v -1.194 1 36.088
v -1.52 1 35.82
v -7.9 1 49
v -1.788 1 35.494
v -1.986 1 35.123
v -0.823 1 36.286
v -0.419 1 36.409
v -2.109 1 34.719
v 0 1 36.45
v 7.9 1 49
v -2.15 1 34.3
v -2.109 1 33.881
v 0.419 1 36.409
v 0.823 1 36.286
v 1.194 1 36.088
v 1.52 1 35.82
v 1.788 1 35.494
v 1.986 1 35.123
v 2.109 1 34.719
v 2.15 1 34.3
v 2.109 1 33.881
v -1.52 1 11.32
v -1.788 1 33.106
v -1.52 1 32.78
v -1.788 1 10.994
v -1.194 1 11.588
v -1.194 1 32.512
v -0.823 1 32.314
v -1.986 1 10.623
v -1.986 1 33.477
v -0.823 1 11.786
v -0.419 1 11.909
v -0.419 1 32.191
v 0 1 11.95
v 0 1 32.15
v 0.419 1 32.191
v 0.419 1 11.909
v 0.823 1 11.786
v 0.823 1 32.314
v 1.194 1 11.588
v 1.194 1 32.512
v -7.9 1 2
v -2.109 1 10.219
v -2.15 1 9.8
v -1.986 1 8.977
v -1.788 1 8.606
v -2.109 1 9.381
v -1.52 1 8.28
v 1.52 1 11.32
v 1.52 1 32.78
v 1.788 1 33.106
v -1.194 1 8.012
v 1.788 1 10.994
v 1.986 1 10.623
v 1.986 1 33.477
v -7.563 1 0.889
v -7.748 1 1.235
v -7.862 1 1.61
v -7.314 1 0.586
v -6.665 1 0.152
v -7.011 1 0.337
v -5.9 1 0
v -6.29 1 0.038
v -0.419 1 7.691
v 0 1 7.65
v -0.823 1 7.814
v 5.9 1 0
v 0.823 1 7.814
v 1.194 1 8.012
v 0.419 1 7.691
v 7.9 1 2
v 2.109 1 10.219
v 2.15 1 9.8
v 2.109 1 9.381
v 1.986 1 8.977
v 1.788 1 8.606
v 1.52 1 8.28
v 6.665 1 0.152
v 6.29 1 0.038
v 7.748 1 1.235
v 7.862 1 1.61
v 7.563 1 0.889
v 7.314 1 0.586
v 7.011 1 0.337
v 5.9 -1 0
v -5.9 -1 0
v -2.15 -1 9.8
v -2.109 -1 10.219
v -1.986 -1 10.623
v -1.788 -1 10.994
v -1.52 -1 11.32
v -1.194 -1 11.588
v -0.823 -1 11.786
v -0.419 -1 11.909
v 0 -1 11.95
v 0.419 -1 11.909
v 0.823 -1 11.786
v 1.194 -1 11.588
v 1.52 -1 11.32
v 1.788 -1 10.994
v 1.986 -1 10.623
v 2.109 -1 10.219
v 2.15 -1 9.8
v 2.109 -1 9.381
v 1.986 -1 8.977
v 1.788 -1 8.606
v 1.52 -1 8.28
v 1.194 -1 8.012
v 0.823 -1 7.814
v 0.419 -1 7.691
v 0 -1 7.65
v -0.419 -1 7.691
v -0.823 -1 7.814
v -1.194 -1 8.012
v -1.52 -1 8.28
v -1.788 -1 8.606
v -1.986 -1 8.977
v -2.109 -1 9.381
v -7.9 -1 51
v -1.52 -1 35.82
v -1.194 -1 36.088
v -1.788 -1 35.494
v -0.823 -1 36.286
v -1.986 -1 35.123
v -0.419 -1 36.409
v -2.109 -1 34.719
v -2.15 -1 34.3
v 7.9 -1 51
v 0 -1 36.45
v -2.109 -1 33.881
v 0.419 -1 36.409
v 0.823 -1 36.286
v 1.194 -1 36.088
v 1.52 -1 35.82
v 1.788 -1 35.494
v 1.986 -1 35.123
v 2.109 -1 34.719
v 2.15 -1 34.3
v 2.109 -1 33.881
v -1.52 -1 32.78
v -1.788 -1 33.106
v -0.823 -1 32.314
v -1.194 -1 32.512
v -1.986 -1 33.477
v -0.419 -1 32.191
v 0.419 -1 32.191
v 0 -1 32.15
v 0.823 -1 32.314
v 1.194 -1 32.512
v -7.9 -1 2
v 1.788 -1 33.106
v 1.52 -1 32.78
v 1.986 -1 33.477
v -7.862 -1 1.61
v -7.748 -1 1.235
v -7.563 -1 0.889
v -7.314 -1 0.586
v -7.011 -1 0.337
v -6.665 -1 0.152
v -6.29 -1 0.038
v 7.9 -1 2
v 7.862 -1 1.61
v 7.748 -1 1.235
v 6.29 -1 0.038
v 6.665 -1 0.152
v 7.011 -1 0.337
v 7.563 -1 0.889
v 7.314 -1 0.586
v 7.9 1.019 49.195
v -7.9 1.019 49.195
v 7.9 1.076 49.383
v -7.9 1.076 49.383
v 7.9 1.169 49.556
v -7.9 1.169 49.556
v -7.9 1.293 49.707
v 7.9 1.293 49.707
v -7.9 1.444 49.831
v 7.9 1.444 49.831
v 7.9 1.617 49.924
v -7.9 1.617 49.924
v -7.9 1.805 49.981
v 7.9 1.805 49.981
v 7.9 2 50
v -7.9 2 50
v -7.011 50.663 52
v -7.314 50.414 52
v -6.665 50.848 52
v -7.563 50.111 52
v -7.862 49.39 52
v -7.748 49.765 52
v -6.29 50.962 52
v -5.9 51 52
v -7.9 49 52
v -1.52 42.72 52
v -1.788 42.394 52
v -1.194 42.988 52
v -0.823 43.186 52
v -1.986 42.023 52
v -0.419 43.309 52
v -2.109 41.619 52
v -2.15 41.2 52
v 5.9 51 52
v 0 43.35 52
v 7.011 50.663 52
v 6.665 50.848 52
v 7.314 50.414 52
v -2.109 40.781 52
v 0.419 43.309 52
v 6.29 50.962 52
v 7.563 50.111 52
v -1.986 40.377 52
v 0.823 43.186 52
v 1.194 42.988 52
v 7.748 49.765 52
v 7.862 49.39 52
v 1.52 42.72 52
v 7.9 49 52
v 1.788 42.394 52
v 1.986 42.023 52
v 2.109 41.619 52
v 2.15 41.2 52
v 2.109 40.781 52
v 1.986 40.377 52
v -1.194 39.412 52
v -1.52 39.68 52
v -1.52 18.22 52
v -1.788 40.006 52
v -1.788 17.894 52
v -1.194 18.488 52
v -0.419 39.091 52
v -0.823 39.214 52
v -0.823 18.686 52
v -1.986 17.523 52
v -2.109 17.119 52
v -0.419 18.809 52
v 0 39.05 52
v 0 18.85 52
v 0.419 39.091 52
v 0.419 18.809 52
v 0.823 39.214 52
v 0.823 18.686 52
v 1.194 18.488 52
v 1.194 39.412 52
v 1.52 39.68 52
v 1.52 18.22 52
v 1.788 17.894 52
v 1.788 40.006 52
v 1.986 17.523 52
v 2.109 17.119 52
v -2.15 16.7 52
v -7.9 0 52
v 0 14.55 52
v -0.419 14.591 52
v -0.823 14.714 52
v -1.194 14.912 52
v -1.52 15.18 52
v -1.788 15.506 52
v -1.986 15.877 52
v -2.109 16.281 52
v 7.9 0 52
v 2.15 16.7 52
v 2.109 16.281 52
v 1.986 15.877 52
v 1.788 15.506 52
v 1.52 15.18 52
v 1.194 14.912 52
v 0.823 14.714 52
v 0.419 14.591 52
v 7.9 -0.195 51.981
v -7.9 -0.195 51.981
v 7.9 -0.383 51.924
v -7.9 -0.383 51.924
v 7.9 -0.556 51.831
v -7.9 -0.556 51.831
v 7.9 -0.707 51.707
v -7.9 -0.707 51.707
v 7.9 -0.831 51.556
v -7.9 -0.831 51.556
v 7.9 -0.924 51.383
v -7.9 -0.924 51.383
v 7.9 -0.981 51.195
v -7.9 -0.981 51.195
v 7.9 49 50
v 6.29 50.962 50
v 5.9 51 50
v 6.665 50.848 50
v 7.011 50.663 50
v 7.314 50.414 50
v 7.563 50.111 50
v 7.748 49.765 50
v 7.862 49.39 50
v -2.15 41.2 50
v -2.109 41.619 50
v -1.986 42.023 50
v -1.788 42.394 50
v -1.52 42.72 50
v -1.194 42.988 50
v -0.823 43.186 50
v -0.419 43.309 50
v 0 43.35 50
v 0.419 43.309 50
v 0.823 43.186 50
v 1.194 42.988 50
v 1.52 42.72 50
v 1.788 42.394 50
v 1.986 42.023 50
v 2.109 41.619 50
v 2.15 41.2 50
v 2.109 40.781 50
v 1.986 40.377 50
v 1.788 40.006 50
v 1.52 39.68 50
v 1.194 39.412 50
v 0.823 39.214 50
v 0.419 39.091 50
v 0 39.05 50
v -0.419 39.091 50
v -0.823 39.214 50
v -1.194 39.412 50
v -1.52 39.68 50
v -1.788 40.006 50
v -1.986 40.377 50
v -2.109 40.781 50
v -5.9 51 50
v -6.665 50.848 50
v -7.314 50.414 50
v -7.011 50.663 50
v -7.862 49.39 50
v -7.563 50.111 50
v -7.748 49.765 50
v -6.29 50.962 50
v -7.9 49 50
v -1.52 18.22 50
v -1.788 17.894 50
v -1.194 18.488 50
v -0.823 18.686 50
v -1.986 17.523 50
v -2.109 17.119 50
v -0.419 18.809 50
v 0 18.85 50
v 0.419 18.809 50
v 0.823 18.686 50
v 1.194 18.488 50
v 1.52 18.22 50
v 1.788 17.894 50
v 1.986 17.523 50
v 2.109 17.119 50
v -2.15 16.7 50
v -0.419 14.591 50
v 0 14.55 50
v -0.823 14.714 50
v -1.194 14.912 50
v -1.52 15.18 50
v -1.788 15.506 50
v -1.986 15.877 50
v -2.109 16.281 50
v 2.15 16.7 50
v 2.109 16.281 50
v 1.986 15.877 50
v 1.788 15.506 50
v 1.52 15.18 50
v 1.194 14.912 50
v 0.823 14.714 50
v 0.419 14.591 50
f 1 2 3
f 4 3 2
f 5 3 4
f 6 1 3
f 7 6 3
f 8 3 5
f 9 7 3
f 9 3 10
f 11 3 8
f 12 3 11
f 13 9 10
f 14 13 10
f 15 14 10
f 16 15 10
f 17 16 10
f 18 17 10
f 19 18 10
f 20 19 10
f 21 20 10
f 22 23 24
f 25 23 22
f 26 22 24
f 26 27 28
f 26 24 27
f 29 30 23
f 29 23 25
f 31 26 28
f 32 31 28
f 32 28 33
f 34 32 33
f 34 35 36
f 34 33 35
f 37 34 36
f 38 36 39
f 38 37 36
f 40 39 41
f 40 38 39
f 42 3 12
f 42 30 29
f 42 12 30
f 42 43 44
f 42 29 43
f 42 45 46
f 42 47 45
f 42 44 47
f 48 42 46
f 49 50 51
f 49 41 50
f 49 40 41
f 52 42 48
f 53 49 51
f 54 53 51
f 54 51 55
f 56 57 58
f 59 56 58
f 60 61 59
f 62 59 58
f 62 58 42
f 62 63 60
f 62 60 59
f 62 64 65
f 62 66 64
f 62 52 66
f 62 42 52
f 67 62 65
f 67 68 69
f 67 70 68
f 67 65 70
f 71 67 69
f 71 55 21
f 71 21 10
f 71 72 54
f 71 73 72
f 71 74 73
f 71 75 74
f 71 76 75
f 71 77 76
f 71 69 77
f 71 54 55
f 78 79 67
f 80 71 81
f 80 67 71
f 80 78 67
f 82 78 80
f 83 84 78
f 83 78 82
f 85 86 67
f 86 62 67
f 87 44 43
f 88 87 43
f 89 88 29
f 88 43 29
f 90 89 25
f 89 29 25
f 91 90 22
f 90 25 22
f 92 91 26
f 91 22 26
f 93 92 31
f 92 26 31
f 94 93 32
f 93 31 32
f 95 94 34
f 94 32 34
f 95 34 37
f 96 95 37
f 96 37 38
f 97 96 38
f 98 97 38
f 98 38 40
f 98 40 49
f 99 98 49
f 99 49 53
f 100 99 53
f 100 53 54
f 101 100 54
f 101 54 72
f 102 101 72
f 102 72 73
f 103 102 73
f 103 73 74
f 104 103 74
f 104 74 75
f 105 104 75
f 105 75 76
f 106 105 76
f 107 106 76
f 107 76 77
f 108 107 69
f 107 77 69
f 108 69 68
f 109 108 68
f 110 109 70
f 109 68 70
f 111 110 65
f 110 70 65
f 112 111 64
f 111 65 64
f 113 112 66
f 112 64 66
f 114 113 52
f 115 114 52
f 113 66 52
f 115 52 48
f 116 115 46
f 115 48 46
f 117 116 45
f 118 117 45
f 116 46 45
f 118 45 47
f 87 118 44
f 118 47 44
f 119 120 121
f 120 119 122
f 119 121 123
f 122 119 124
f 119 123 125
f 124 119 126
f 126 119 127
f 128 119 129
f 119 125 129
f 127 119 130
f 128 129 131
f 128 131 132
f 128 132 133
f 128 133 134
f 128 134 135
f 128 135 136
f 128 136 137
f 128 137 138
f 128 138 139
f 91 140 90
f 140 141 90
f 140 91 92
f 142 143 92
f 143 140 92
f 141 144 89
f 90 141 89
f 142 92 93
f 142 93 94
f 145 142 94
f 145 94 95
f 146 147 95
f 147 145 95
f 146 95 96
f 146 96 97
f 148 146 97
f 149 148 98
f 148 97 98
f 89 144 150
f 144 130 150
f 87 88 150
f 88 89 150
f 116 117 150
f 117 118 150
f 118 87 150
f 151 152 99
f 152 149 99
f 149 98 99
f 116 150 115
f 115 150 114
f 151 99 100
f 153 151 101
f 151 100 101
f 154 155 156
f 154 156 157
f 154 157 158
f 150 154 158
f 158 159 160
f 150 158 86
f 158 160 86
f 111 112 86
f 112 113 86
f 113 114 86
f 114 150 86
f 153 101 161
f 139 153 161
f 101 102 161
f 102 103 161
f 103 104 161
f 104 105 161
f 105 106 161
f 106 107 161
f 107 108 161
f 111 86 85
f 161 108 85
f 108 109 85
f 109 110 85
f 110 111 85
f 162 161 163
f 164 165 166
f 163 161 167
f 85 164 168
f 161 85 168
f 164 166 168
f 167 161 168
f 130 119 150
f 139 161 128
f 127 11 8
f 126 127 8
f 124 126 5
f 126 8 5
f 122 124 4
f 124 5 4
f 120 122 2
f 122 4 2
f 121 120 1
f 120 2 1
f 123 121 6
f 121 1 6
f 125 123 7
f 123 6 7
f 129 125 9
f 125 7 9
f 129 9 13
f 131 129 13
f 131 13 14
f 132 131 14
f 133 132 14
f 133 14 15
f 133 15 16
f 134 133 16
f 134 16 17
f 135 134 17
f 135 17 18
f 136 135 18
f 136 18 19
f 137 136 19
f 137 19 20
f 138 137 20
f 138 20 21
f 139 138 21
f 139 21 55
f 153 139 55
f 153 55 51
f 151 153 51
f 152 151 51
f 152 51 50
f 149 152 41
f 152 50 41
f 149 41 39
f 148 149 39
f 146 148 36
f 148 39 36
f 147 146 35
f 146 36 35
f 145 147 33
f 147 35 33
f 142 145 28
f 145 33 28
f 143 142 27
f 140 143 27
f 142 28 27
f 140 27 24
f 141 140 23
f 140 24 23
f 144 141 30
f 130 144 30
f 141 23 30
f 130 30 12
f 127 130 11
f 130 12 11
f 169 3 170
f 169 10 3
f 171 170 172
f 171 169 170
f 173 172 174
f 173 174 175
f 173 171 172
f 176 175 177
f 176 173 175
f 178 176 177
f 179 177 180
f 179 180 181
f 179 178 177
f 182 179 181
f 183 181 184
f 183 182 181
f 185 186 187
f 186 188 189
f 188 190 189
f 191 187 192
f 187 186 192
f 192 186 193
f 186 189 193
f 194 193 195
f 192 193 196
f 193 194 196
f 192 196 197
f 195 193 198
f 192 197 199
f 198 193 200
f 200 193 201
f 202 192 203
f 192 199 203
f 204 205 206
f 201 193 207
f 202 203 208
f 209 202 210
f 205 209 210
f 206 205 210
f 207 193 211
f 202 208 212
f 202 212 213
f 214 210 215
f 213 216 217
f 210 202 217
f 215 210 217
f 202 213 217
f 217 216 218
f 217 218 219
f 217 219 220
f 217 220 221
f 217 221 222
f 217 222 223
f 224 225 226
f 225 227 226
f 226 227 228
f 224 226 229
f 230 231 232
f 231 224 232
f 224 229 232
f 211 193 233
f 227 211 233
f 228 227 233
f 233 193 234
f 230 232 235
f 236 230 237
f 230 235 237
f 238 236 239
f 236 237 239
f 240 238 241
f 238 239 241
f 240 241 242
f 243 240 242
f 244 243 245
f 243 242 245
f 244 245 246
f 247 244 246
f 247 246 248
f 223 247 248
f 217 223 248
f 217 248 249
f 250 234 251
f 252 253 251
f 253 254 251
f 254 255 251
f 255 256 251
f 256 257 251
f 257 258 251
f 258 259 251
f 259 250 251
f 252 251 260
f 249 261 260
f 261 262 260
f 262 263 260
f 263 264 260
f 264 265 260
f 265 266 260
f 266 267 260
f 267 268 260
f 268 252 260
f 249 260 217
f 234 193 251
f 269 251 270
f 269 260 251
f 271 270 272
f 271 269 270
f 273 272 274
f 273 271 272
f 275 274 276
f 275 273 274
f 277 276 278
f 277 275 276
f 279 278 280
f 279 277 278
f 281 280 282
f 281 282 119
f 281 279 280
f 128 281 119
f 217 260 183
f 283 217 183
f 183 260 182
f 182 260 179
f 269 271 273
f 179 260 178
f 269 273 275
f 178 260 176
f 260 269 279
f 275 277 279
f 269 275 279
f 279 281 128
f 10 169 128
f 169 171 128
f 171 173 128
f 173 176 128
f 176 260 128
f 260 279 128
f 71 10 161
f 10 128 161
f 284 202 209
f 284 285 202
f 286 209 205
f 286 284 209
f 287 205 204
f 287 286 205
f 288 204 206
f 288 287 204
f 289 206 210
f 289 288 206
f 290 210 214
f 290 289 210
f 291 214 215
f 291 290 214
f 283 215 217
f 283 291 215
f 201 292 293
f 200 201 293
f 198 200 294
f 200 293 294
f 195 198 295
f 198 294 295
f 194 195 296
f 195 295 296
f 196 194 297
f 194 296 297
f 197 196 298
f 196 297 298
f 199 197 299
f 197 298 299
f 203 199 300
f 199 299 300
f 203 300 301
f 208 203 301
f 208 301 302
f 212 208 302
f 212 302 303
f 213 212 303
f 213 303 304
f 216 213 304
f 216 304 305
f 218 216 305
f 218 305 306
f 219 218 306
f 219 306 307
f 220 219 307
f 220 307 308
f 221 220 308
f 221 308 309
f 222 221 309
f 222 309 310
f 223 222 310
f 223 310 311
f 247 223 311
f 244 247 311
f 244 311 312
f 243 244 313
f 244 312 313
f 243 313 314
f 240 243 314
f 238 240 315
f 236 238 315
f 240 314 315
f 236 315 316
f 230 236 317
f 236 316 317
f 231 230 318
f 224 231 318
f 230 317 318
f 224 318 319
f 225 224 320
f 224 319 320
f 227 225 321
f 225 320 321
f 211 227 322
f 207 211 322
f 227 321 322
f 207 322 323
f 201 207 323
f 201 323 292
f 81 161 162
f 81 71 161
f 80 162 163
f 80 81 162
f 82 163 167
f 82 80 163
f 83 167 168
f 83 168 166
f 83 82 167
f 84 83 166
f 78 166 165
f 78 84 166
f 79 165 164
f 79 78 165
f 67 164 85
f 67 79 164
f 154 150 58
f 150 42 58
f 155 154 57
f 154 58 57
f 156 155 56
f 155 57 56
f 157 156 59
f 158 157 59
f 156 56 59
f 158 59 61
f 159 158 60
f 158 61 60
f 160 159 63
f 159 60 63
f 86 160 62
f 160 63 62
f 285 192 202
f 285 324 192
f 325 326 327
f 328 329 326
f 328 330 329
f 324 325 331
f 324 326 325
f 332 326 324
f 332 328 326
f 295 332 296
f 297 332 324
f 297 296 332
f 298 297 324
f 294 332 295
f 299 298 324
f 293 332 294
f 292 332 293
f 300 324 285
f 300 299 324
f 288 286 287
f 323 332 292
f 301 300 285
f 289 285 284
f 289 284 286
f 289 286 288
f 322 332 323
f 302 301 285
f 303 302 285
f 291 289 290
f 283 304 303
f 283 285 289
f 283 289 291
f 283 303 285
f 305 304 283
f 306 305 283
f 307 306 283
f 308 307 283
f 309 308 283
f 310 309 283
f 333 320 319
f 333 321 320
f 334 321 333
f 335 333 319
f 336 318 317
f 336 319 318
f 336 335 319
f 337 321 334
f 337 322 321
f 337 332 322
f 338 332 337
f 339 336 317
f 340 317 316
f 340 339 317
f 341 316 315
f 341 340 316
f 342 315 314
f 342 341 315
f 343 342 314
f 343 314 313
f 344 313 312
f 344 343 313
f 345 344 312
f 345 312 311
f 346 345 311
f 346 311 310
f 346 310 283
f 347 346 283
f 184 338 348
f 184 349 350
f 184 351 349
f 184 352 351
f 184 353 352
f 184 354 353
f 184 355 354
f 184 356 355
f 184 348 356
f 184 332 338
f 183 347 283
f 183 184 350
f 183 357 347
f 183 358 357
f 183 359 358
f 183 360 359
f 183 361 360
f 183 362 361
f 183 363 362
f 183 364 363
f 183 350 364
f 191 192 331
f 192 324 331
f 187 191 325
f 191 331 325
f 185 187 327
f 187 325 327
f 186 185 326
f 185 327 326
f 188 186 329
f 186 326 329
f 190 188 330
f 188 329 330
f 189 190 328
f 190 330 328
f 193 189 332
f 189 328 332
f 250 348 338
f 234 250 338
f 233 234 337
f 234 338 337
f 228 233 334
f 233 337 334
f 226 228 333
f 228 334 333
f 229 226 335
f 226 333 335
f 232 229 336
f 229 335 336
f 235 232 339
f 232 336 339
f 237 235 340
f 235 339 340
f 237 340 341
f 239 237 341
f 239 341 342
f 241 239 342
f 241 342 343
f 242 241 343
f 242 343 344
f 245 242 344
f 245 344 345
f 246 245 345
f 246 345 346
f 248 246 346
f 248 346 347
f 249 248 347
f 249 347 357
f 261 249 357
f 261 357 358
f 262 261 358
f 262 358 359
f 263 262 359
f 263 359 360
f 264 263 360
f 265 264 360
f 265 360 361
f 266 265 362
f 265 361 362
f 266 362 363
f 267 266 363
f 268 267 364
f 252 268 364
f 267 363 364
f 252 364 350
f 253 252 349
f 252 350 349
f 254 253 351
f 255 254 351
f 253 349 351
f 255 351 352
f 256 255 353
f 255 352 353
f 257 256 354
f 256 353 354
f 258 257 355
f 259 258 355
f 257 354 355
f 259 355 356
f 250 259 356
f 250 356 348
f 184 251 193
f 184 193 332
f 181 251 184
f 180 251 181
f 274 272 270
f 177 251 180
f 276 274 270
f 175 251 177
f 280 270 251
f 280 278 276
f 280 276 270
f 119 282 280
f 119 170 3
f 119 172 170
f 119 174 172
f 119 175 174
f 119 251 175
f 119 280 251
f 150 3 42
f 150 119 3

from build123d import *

# Parameters (mm, degrees)
SKETCH_1_W          = 15.8
SKETCH_1_H          = 2
EXTRUDE_1_DEPTH     = 52
SKETCH_2_W          = 15.8
SKETCH_2_H          = 2
EXTRUDE_2_DEPTH     = 50
FILLET_5_R          = 1
FILLET_6_R          = 1
FILLET_7_R          = 2
FILLET_8_R          = 2
SKETCH_3_R          = 2.15
CUT_EXTRUDE_1_DEPTH = 50
SKETCH_8_R          = 2.15
CUT_EXTRUDE_3_DEPTH = 50


with BuildPart() as part:
    # 草圖1 → 填料-伸長1 (new body)
    with BuildSketch(Plane.XY):
        Rectangle(SKETCH_1_W, SKETCH_1_H)
    extrude(amount=EXTRUDE_1_DEPTH)

    # 草圖2 → 填料-伸長2 (add)
    with BuildSketch(Plane(origin=(0, 1, 0), x_dir=(1, 0, 0), z_dir=(0, 1, 0))):
        with Locations((0, -51)):
            Rectangle(SKETCH_2_W, SKETCH_2_H)
    extrude(amount=EXTRUDE_2_DEPTH)

    # 圓角5
    fillet_5_edges = [part.edges().sort_by_distance(p)[0] for p in [
        (0, -1, 52),
    ]]
    fillet(fillet_5_edges, radius=FILLET_5_R)

    # 圓角6
    fillet_6_edges = [part.edges().sort_by_distance(p)[0] for p in [
        (0, 1, 50),
    ]]
    fillet(fillet_6_edges, radius=FILLET_6_R)

    # 圓角7
    fillet_7_edges = [part.edges().sort_by_distance(p)[0] for p in [
        (7.9, 51, 51),
    ]]
    fillet(fillet_7_edges, radius=FILLET_7_R)

    # 圓角8
    fillet_8_edges = [part.edges().sort_by_distance(p)[0] for p in [
        (-7.9, 51, 51),
        (7.9, 0, 0),
        (-7.9, 0, 0),
    ]]
    fillet(fillet_8_edges, radius=FILLET_8_R)

    # 草圖3 → 除料-伸長1 (cut)
    with BuildSketch(Plane(origin=(0, 0, 50), x_dir=(-1, 0, 0), z_dir=(0, 0, -1))):
        with Locations((0, 41.2)):
            Circle(SKETCH_3_R)
        with Locations((0, 16.7)):
            Circle(SKETCH_3_R)
    extrude(amount=-CUT_EXTRUDE_1_DEPTH, mode=Mode.SUBTRACT)

    # 草圖8 → 除料-伸長3 (cut)
    with BuildSketch(Plane(origin=(0, 1, 0), x_dir=(1, 0, 0), z_dir=(0, 1, 0))):
        with Locations(Location((0, -9.8, 0), (0, 0, 180))):
            Circle(SKETCH_8_R)
        with Locations(Location((0, -34.3, 0), (0, 0, 180))):
            Circle(SKETCH_8_R)
    extrude(amount=-CUT_EXTRUDE_3_DEPTH, mode=Mode.SUBTRACT)


solid = part.part
